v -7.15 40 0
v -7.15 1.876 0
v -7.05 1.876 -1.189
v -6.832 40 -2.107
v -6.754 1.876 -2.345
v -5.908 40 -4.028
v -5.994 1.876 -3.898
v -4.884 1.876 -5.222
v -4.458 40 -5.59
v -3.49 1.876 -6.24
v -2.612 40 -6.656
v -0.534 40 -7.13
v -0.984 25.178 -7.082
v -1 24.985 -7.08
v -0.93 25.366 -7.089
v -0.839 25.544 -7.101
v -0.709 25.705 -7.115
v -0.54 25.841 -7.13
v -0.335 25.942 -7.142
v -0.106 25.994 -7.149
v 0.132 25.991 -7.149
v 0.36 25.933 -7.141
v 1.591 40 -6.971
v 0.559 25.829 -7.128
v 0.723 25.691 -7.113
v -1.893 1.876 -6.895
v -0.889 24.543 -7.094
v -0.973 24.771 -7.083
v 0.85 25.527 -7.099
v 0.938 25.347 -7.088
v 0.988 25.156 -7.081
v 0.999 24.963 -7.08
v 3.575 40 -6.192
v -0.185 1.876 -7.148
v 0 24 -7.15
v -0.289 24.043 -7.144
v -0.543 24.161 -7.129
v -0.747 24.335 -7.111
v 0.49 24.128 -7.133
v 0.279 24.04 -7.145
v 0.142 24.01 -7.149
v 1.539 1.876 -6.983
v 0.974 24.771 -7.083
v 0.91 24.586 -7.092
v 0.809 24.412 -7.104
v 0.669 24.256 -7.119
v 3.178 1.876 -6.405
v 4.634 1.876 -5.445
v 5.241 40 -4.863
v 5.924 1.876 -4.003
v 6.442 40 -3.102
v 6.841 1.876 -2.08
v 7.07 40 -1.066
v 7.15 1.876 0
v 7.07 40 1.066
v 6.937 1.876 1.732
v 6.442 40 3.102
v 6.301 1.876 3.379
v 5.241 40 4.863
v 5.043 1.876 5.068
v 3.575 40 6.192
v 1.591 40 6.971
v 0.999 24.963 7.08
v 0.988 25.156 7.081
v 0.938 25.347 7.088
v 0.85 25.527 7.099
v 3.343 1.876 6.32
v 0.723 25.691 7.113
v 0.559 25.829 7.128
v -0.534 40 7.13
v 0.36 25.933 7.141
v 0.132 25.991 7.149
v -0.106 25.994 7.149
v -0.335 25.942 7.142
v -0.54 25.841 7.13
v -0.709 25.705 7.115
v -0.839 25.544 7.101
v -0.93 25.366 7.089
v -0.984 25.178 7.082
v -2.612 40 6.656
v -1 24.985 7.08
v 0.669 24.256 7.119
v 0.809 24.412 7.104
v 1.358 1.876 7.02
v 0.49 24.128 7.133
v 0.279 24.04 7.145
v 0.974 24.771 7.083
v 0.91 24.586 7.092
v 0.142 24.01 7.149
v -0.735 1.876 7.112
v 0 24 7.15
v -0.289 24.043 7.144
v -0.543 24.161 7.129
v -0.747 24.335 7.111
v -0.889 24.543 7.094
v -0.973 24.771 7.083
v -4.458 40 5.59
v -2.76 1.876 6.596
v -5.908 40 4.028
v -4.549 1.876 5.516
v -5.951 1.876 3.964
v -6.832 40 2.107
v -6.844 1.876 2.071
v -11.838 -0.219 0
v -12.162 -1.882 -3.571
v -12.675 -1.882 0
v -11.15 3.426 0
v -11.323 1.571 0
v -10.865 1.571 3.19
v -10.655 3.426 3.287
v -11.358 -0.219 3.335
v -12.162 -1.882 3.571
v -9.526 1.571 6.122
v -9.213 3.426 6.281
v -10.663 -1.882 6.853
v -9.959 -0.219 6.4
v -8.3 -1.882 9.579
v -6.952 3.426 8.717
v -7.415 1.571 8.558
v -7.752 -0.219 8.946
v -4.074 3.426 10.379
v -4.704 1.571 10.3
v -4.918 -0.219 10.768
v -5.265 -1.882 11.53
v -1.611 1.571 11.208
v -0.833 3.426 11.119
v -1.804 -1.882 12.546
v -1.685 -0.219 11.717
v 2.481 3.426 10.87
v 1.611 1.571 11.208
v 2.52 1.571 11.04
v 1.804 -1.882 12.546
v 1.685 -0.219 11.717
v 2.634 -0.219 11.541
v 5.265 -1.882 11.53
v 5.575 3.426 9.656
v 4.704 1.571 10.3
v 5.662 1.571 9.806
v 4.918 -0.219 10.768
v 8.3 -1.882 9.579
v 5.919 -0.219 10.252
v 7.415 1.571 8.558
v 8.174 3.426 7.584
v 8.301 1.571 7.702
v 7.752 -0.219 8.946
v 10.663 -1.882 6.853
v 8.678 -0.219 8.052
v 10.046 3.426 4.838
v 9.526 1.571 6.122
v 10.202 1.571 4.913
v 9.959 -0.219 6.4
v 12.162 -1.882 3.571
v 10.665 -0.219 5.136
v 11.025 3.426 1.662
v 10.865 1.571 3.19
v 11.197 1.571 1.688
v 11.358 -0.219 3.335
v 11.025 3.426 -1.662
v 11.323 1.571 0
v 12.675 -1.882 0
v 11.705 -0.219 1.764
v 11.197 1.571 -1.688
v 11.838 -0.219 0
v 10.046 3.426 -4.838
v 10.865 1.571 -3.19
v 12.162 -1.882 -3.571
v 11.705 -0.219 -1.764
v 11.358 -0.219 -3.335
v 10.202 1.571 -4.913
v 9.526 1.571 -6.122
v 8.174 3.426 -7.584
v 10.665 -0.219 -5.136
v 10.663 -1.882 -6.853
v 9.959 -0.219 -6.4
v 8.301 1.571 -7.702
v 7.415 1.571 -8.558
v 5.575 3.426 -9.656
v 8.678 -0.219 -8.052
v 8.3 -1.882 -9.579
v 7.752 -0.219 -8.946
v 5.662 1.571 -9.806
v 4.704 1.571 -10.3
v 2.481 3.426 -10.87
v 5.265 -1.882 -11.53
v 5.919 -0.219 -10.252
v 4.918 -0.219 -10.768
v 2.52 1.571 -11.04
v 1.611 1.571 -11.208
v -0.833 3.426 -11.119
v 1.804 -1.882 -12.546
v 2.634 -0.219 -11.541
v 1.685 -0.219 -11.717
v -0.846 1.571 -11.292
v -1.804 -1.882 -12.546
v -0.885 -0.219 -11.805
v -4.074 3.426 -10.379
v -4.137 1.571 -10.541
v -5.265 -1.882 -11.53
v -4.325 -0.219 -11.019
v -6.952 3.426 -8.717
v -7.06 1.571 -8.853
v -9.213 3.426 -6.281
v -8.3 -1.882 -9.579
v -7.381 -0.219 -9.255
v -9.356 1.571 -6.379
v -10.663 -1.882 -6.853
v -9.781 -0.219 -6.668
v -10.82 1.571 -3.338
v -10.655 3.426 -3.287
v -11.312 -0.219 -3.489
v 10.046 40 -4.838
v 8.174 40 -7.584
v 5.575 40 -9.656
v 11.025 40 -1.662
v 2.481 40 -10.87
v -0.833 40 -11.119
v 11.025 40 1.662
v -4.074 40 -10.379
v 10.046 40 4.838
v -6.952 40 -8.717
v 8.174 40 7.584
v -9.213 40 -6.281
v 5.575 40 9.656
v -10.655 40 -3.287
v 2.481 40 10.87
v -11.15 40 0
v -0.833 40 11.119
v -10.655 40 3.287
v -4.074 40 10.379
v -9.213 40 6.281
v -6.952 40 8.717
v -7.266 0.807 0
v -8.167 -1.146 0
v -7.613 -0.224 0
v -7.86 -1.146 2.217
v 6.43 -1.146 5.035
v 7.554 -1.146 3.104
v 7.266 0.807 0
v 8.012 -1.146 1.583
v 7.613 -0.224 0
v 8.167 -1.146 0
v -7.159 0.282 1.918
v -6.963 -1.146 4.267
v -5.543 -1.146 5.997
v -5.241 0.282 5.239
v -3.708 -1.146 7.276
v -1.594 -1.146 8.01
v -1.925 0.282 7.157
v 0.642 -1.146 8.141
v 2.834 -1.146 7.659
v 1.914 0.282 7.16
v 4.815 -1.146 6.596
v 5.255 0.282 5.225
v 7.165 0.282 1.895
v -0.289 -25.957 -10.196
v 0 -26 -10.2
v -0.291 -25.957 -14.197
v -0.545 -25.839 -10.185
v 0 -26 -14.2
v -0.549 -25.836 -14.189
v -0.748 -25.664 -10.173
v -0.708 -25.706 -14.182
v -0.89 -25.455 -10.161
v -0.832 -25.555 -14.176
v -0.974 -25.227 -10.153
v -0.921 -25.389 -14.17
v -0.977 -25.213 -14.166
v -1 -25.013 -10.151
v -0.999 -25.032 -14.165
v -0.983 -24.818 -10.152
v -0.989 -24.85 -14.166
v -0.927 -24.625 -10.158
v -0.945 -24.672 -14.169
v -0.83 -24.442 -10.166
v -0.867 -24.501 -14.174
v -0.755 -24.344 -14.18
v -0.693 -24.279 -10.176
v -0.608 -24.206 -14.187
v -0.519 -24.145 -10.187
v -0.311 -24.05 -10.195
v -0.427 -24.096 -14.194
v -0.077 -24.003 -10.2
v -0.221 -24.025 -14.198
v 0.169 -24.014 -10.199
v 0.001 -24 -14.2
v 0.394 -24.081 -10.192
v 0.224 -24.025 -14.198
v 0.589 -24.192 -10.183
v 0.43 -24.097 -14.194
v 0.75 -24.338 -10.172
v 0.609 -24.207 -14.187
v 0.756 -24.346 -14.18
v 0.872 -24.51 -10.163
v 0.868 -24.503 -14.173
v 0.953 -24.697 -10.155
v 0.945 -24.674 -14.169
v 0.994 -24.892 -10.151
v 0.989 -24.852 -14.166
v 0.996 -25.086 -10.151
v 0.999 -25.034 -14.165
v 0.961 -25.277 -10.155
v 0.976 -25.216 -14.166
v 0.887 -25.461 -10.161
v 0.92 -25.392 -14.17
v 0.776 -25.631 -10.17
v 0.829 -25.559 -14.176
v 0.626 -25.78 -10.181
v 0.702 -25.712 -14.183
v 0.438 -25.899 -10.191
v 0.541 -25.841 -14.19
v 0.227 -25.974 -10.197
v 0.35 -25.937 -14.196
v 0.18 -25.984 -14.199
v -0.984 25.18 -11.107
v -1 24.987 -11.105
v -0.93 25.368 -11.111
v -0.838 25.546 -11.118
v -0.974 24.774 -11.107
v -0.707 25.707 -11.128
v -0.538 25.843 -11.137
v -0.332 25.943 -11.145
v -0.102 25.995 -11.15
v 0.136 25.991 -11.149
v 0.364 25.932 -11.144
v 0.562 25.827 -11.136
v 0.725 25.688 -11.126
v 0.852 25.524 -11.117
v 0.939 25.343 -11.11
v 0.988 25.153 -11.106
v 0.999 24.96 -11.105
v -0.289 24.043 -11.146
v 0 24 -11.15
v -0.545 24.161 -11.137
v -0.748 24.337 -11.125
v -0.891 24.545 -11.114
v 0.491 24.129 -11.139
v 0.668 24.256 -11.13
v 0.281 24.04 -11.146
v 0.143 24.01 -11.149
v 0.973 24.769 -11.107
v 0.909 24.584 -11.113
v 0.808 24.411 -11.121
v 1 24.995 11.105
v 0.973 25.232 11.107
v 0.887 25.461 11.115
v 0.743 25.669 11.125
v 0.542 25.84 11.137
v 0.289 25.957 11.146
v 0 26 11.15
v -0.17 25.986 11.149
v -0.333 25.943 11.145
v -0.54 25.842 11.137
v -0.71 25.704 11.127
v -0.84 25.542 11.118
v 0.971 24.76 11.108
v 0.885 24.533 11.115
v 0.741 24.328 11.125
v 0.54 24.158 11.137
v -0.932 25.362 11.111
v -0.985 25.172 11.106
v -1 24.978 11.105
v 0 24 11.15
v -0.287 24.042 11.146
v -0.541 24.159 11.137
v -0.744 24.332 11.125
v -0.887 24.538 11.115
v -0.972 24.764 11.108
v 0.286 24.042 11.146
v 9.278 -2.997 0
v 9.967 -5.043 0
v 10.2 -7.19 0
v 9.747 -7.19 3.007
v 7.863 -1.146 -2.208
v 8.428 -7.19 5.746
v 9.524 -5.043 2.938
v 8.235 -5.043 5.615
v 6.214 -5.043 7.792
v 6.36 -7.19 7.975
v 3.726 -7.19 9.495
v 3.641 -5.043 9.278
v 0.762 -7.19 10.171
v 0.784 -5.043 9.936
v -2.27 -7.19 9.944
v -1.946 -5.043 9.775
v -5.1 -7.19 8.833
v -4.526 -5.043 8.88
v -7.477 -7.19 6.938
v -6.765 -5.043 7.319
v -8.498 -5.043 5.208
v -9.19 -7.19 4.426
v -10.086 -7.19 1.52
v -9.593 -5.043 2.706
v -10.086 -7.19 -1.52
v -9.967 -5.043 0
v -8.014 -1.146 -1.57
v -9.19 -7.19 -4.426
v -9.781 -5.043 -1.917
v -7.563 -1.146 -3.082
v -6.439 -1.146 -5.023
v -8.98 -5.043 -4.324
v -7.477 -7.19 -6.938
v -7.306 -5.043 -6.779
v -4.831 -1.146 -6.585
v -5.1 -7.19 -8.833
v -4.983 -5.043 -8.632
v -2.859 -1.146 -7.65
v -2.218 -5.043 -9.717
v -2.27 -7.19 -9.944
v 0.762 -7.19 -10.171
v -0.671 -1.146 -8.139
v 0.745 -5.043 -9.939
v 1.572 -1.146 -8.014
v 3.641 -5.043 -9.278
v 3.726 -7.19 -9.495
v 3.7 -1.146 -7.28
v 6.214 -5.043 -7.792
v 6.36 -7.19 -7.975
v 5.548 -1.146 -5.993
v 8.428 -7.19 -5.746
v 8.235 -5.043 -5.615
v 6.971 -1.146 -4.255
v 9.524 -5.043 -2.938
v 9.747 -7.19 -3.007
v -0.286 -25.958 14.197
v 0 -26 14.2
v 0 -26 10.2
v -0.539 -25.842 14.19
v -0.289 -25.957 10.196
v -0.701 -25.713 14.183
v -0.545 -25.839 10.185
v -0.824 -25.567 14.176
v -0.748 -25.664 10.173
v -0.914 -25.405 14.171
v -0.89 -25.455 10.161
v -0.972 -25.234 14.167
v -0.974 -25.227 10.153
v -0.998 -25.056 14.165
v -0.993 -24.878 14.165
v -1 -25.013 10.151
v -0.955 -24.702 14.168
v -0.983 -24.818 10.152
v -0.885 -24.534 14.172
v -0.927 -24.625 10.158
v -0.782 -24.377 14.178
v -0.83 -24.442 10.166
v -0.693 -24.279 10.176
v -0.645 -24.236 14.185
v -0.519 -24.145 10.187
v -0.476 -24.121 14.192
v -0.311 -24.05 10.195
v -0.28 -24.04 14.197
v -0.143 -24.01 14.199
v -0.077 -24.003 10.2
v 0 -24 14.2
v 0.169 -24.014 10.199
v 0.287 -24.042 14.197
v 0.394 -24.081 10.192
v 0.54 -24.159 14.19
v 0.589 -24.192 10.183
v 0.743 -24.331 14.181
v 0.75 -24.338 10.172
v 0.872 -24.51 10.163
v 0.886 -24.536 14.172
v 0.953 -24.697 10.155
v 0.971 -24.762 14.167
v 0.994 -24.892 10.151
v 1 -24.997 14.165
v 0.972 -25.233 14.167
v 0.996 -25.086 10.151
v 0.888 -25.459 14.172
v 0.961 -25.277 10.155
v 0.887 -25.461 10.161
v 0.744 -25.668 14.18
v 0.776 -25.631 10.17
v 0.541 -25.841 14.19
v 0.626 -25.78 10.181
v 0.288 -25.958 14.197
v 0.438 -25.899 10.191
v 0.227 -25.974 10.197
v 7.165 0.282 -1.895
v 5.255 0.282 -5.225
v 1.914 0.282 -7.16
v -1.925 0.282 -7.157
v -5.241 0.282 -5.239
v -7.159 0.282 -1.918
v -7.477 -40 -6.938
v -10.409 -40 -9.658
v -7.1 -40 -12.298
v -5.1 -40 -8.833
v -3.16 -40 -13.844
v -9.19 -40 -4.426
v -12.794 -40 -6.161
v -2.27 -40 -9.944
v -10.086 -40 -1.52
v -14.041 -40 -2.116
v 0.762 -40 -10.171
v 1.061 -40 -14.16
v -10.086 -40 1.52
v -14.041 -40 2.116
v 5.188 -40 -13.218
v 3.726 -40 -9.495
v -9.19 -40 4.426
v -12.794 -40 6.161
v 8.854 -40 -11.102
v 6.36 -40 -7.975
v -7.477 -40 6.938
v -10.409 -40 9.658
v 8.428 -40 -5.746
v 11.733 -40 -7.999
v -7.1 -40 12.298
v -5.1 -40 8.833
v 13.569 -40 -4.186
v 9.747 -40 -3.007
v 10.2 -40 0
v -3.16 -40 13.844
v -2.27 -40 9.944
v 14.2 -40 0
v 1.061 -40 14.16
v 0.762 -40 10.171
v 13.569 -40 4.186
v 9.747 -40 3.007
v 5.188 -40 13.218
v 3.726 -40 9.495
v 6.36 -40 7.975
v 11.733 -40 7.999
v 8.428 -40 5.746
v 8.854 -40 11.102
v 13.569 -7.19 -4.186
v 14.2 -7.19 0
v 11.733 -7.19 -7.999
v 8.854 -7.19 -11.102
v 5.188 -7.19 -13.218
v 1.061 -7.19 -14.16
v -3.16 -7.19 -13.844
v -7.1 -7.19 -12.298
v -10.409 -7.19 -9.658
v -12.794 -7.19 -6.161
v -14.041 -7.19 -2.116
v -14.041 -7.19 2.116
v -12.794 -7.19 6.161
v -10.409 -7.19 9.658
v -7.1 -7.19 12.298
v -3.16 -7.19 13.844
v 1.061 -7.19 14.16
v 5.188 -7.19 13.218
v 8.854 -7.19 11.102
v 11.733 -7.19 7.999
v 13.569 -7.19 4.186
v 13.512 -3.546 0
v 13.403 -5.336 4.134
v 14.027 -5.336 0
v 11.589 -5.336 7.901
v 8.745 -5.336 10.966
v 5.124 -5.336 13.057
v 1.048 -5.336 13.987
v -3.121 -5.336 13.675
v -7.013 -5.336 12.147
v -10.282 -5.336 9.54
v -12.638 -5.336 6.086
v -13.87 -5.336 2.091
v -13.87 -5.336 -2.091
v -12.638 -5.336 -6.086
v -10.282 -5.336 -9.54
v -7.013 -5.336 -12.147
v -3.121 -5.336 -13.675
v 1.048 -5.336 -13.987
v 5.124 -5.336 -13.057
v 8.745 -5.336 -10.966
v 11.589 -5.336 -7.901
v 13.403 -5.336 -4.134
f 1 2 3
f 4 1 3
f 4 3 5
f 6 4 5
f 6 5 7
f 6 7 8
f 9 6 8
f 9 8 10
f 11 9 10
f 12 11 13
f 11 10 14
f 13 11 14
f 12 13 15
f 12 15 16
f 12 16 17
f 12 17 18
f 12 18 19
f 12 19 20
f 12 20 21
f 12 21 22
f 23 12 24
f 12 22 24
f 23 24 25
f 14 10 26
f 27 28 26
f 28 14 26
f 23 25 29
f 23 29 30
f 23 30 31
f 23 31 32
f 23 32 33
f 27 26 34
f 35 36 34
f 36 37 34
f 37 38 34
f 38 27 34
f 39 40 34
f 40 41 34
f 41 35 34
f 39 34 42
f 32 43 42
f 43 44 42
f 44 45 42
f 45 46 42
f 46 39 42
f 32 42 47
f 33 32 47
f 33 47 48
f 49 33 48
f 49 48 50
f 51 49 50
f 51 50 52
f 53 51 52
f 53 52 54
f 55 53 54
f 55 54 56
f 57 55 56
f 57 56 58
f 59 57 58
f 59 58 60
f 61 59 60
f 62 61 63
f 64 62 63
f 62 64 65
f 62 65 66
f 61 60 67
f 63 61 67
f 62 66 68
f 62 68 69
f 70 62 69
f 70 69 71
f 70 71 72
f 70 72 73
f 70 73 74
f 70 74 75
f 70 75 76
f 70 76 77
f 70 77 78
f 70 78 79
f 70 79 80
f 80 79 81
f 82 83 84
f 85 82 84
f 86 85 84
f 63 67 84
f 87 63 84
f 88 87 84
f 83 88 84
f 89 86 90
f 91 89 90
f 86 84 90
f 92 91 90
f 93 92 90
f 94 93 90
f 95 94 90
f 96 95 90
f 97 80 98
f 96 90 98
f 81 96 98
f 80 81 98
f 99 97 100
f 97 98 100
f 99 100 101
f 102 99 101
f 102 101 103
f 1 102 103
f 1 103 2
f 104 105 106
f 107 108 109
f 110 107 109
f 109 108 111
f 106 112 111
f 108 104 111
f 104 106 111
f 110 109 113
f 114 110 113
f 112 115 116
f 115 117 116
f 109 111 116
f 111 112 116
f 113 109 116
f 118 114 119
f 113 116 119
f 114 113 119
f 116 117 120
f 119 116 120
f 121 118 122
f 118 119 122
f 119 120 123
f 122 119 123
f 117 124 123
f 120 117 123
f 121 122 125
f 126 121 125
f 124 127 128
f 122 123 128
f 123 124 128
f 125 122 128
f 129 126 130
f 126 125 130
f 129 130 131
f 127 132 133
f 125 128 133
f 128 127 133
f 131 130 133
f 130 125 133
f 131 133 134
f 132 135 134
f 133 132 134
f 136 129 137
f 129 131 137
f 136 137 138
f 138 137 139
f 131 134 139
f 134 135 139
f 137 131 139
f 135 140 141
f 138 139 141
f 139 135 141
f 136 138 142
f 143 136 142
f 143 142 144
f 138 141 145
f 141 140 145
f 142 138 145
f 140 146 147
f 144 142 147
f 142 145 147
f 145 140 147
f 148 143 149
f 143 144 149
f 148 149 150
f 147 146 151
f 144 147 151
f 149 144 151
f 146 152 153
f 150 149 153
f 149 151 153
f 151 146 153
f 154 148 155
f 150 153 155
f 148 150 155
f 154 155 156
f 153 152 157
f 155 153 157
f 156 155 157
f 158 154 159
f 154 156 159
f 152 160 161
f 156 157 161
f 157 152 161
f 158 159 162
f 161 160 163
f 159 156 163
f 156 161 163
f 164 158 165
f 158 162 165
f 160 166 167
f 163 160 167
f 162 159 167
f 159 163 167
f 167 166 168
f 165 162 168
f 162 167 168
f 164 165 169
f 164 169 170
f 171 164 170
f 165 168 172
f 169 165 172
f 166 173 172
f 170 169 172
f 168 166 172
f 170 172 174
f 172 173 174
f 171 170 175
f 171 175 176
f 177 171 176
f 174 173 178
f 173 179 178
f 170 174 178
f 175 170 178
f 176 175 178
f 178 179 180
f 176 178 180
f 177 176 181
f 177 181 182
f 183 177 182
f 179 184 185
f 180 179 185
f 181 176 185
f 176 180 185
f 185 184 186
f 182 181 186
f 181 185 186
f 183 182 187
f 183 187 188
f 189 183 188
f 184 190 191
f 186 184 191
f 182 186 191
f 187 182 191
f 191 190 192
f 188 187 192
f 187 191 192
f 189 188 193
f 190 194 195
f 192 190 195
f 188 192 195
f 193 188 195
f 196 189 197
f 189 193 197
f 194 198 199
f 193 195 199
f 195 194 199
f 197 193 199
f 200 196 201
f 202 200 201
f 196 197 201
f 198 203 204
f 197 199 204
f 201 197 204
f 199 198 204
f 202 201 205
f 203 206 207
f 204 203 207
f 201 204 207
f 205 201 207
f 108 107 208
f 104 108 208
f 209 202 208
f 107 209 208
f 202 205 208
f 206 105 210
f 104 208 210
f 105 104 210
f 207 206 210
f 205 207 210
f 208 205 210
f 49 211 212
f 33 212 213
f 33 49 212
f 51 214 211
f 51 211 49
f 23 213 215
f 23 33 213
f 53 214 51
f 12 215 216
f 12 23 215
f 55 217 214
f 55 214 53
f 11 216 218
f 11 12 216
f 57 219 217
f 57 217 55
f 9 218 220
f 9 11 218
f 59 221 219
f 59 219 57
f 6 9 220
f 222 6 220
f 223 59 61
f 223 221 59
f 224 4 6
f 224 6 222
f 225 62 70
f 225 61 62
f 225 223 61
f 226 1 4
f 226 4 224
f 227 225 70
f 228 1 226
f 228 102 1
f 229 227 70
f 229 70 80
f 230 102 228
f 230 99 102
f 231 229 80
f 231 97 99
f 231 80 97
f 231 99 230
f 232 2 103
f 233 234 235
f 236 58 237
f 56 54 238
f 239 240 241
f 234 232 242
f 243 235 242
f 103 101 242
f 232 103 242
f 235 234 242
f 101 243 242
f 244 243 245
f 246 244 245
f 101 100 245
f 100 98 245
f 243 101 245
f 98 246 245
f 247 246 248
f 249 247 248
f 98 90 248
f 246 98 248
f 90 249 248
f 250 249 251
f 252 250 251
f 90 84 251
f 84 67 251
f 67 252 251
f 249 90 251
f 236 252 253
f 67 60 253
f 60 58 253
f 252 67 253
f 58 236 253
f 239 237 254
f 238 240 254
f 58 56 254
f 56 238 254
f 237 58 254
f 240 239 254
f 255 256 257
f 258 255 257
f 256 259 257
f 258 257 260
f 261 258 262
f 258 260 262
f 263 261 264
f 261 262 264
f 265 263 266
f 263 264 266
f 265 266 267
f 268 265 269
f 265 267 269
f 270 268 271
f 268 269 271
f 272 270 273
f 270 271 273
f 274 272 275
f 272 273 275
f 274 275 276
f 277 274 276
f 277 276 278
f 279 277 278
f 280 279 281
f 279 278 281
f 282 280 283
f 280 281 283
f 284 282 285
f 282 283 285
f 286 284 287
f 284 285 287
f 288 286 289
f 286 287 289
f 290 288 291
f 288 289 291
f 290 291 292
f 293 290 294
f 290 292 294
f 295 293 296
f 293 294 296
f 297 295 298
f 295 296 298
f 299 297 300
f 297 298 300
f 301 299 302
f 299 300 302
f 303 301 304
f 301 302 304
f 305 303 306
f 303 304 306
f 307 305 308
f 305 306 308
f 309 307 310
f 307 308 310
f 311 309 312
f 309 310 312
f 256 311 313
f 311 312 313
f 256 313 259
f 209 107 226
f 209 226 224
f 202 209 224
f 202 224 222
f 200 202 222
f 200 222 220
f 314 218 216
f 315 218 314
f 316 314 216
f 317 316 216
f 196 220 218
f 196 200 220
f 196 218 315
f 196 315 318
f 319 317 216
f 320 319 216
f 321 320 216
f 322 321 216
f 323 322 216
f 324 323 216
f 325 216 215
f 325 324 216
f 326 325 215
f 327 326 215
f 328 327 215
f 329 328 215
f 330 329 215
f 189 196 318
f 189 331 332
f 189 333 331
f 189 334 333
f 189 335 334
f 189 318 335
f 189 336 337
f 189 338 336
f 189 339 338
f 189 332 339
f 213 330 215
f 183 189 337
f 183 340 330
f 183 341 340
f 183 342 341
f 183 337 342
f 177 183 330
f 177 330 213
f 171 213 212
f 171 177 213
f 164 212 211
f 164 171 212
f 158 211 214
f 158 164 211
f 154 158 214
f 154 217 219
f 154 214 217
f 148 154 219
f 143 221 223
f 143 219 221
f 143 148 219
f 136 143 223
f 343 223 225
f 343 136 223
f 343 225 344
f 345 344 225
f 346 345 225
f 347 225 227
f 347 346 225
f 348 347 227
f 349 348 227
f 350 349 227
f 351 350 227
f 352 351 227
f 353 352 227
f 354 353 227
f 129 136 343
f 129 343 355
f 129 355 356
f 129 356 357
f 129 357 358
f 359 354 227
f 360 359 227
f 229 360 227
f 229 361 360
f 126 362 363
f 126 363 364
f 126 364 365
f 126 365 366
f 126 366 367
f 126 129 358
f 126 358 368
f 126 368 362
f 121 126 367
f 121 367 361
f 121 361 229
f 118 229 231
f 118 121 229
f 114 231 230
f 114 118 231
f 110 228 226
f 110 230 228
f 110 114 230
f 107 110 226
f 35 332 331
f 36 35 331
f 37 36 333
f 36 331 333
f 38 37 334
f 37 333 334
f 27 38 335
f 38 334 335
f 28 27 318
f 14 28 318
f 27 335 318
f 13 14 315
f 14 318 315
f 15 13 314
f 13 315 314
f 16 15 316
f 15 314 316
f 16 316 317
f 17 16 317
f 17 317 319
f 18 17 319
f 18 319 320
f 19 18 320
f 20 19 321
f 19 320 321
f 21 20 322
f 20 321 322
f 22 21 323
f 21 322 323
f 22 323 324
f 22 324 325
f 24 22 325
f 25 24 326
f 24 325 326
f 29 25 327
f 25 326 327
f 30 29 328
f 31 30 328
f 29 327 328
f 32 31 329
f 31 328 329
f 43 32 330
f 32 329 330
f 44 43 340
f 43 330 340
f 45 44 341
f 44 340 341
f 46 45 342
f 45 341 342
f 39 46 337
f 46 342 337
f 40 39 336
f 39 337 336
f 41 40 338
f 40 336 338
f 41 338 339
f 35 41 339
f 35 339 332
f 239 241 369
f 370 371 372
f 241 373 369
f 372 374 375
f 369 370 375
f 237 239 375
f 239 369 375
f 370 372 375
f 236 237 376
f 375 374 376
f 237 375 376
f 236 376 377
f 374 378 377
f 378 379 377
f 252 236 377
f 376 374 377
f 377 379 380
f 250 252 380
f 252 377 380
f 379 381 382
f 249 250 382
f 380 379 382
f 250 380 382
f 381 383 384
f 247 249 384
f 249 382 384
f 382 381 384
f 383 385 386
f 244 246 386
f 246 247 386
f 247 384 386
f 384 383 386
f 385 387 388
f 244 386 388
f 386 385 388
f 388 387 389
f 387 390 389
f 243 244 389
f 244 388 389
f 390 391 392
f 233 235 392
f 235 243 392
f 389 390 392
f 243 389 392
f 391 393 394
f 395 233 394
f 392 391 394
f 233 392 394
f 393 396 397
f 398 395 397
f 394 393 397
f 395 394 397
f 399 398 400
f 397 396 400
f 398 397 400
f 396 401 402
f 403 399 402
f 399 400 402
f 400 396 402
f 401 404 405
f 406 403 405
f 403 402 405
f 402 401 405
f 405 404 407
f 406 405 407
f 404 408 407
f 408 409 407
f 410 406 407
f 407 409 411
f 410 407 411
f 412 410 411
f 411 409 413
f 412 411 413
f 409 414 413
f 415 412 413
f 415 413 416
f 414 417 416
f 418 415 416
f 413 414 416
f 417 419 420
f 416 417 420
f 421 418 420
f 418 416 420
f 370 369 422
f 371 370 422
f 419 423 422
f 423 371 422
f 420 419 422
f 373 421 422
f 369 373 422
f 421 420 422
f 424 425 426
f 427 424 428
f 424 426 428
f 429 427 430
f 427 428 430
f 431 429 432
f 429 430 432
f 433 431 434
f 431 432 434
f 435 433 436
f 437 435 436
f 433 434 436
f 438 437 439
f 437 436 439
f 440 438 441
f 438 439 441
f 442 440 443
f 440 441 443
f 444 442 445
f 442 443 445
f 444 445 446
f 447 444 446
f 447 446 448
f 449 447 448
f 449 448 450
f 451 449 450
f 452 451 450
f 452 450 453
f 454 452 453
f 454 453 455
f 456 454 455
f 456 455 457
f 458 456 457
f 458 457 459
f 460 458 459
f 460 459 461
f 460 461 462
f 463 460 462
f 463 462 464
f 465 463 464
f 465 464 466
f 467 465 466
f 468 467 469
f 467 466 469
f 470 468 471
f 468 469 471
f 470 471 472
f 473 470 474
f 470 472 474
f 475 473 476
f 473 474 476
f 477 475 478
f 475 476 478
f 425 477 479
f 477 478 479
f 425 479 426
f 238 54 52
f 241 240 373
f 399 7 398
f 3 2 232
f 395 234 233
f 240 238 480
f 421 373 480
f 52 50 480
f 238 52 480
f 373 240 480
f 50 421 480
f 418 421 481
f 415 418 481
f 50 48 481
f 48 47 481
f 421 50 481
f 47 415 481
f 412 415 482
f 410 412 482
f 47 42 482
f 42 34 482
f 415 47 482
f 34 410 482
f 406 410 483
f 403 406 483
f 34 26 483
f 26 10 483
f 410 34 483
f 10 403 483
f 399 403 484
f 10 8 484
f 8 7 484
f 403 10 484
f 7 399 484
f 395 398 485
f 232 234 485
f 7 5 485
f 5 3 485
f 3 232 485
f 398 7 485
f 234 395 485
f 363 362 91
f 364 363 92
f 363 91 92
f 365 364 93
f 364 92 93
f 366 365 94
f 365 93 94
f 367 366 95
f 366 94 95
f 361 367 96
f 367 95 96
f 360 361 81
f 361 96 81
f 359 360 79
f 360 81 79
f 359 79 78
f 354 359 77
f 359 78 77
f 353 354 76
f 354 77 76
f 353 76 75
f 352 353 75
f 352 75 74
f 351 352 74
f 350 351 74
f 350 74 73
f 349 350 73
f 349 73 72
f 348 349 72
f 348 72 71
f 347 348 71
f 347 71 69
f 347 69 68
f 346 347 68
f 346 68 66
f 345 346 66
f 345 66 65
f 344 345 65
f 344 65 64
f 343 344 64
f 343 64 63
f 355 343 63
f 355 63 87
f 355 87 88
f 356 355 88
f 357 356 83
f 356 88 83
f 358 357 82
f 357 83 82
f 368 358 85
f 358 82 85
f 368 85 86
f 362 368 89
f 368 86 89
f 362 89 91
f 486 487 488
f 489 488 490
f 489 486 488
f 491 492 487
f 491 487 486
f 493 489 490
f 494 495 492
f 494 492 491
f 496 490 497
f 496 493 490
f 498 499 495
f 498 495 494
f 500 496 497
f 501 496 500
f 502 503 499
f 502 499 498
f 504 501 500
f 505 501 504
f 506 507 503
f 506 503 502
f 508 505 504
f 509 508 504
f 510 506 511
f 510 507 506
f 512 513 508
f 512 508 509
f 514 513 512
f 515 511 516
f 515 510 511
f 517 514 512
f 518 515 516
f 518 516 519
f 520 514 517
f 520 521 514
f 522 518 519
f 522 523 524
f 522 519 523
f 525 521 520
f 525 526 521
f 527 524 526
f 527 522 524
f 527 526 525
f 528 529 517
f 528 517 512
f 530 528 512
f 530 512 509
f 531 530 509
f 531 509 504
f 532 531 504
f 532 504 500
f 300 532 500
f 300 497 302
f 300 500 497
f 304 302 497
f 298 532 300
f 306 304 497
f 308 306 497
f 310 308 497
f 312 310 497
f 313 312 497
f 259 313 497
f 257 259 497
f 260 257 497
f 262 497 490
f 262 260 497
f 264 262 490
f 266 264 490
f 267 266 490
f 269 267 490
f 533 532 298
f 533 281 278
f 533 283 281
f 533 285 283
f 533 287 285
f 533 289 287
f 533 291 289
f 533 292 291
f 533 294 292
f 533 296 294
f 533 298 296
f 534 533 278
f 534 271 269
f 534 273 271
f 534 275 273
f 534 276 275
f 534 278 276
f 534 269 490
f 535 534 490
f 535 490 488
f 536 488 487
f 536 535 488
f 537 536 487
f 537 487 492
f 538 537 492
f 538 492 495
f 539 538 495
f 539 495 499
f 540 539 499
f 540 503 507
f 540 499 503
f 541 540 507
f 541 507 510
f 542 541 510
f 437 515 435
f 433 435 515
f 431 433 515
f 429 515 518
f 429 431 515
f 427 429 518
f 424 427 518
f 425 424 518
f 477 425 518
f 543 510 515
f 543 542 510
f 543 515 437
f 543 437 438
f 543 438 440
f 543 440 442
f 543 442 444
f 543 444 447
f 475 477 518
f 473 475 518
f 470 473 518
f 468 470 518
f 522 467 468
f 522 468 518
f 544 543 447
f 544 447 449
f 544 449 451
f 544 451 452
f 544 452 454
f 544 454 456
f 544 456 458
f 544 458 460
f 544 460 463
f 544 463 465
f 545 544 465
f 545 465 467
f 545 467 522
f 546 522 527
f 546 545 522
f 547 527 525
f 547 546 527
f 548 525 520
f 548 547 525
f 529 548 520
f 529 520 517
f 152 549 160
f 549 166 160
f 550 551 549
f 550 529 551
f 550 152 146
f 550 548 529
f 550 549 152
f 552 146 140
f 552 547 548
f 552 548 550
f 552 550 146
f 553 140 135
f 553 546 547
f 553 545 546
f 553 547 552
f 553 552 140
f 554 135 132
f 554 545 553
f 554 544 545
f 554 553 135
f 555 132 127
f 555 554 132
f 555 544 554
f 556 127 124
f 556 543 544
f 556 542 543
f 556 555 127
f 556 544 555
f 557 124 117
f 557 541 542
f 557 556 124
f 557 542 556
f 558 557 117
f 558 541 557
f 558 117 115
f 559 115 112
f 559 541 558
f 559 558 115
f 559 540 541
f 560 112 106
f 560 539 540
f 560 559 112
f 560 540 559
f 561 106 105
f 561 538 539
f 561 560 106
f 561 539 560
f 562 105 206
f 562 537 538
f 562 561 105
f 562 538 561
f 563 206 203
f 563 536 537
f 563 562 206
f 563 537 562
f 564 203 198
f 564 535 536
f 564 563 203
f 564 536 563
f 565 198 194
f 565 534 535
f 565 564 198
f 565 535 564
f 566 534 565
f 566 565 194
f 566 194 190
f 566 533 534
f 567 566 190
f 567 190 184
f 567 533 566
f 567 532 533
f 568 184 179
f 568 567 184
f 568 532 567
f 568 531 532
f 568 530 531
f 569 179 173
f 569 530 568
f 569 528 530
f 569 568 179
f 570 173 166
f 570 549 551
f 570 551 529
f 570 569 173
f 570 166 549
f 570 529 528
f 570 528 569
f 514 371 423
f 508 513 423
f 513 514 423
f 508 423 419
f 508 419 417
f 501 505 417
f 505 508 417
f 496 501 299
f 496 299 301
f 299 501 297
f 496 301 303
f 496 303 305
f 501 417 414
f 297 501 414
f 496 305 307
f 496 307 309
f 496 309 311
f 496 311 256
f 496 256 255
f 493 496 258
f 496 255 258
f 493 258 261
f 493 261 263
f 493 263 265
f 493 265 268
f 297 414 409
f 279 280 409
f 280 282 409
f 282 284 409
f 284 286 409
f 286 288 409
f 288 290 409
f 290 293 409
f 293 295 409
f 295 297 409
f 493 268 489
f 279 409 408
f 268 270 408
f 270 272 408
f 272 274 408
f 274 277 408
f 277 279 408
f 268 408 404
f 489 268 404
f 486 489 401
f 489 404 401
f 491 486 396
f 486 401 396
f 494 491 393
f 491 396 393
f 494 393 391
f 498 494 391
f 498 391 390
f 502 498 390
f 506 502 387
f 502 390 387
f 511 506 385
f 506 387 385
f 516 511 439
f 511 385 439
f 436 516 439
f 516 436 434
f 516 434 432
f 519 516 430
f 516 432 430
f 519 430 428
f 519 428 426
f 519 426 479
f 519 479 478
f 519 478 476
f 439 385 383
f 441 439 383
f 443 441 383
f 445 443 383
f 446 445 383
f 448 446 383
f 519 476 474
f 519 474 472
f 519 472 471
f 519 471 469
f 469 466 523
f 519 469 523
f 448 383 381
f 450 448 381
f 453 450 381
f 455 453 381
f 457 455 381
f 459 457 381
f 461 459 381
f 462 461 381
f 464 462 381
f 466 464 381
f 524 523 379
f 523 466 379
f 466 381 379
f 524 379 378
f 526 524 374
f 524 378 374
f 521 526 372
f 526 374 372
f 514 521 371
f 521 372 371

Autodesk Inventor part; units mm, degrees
ref_plane "YZ Plane" through (0, 0, 0) normal (1, 0, 0) x (0, 1, 0)
sketch "Sketch1" plane through (0, 0, 0) normal (0, 1, 0) x (-1, 0, 0)
  circle A0 centre (0, 0) radius 7.15
  circle A1 centre (0, 0) radius 11.15
  point P0 (0, 11.15)
  dimension "d1" = 22.3
  dimension "d0" = 14.3
extrude "Small" add sketch "Sketch1" along normal blind 40
sketch "Sketch2" plane through (0, 0, 0) normal (0, -1, 0) x (1, 0, 0)
  circle A0 centre (0, 0) radius 7.15 projected
  circle A1 centre (0, 0) radius 10.2
  circle A2 centre (0, 0) radius 11.15 projected
  circle A3 centre (0, 0) radius 14.2
  point P0 (0, 14.2)
  dimension "d5" = 28.4
  dimension "d4" = 20.4
extrude "Big" add sketch "Sketch2" along normal blind 40 contours A2 | A3
ref_plane "Work Plane1" through (0, 0, 11.15) normal (0, 0, 1) x (1, 0, 0)
ref_plane "Work Plane2" through (0, 0, 14.2) normal (0, 0, 1) x (1, 0, 0)
sketch "Sketch3" plane through (0, 0, 11.15) normal (0, 0, 1) x (1, 0, 0)
  line L0 (11.15, 40) -> (-11.15, 40) projected
  point P0 (0, 0)
  point P1 (0, 25)
  dimension "d25" = 15
hole "Screw Hole for small" at (0, 25, 11.15) direction (0, 0, -1) diameter 2 end through all
sketch "Sketch4" plane through (0, 0, 14.2) normal (0, 0, 1) x (1, 0, 0)
  line L0 (-14.2, -40) -> (14.2, -40) projected
  point P0 (0, 0)
  point P1 (0, -25)
  dimension "d24" = 15
hole "Screw Hole for big" at (0, -25, 14.2) direction (0, 0, -1) diameter 2 end through all
fillet "Fillet1 outside" radius 10 2 edges at (-14.2, 0, 0) (11.15, 0, 0)
fillet "Fillet2 Inside" radius 10 1 edges at (-10.2, 0, 0)
fillet "Fillet3" radius 5 2 edges at (0, 0, 7.15) (0, 0, -7.15)
properties part number "hollowCylinderTest_3DPrint"
